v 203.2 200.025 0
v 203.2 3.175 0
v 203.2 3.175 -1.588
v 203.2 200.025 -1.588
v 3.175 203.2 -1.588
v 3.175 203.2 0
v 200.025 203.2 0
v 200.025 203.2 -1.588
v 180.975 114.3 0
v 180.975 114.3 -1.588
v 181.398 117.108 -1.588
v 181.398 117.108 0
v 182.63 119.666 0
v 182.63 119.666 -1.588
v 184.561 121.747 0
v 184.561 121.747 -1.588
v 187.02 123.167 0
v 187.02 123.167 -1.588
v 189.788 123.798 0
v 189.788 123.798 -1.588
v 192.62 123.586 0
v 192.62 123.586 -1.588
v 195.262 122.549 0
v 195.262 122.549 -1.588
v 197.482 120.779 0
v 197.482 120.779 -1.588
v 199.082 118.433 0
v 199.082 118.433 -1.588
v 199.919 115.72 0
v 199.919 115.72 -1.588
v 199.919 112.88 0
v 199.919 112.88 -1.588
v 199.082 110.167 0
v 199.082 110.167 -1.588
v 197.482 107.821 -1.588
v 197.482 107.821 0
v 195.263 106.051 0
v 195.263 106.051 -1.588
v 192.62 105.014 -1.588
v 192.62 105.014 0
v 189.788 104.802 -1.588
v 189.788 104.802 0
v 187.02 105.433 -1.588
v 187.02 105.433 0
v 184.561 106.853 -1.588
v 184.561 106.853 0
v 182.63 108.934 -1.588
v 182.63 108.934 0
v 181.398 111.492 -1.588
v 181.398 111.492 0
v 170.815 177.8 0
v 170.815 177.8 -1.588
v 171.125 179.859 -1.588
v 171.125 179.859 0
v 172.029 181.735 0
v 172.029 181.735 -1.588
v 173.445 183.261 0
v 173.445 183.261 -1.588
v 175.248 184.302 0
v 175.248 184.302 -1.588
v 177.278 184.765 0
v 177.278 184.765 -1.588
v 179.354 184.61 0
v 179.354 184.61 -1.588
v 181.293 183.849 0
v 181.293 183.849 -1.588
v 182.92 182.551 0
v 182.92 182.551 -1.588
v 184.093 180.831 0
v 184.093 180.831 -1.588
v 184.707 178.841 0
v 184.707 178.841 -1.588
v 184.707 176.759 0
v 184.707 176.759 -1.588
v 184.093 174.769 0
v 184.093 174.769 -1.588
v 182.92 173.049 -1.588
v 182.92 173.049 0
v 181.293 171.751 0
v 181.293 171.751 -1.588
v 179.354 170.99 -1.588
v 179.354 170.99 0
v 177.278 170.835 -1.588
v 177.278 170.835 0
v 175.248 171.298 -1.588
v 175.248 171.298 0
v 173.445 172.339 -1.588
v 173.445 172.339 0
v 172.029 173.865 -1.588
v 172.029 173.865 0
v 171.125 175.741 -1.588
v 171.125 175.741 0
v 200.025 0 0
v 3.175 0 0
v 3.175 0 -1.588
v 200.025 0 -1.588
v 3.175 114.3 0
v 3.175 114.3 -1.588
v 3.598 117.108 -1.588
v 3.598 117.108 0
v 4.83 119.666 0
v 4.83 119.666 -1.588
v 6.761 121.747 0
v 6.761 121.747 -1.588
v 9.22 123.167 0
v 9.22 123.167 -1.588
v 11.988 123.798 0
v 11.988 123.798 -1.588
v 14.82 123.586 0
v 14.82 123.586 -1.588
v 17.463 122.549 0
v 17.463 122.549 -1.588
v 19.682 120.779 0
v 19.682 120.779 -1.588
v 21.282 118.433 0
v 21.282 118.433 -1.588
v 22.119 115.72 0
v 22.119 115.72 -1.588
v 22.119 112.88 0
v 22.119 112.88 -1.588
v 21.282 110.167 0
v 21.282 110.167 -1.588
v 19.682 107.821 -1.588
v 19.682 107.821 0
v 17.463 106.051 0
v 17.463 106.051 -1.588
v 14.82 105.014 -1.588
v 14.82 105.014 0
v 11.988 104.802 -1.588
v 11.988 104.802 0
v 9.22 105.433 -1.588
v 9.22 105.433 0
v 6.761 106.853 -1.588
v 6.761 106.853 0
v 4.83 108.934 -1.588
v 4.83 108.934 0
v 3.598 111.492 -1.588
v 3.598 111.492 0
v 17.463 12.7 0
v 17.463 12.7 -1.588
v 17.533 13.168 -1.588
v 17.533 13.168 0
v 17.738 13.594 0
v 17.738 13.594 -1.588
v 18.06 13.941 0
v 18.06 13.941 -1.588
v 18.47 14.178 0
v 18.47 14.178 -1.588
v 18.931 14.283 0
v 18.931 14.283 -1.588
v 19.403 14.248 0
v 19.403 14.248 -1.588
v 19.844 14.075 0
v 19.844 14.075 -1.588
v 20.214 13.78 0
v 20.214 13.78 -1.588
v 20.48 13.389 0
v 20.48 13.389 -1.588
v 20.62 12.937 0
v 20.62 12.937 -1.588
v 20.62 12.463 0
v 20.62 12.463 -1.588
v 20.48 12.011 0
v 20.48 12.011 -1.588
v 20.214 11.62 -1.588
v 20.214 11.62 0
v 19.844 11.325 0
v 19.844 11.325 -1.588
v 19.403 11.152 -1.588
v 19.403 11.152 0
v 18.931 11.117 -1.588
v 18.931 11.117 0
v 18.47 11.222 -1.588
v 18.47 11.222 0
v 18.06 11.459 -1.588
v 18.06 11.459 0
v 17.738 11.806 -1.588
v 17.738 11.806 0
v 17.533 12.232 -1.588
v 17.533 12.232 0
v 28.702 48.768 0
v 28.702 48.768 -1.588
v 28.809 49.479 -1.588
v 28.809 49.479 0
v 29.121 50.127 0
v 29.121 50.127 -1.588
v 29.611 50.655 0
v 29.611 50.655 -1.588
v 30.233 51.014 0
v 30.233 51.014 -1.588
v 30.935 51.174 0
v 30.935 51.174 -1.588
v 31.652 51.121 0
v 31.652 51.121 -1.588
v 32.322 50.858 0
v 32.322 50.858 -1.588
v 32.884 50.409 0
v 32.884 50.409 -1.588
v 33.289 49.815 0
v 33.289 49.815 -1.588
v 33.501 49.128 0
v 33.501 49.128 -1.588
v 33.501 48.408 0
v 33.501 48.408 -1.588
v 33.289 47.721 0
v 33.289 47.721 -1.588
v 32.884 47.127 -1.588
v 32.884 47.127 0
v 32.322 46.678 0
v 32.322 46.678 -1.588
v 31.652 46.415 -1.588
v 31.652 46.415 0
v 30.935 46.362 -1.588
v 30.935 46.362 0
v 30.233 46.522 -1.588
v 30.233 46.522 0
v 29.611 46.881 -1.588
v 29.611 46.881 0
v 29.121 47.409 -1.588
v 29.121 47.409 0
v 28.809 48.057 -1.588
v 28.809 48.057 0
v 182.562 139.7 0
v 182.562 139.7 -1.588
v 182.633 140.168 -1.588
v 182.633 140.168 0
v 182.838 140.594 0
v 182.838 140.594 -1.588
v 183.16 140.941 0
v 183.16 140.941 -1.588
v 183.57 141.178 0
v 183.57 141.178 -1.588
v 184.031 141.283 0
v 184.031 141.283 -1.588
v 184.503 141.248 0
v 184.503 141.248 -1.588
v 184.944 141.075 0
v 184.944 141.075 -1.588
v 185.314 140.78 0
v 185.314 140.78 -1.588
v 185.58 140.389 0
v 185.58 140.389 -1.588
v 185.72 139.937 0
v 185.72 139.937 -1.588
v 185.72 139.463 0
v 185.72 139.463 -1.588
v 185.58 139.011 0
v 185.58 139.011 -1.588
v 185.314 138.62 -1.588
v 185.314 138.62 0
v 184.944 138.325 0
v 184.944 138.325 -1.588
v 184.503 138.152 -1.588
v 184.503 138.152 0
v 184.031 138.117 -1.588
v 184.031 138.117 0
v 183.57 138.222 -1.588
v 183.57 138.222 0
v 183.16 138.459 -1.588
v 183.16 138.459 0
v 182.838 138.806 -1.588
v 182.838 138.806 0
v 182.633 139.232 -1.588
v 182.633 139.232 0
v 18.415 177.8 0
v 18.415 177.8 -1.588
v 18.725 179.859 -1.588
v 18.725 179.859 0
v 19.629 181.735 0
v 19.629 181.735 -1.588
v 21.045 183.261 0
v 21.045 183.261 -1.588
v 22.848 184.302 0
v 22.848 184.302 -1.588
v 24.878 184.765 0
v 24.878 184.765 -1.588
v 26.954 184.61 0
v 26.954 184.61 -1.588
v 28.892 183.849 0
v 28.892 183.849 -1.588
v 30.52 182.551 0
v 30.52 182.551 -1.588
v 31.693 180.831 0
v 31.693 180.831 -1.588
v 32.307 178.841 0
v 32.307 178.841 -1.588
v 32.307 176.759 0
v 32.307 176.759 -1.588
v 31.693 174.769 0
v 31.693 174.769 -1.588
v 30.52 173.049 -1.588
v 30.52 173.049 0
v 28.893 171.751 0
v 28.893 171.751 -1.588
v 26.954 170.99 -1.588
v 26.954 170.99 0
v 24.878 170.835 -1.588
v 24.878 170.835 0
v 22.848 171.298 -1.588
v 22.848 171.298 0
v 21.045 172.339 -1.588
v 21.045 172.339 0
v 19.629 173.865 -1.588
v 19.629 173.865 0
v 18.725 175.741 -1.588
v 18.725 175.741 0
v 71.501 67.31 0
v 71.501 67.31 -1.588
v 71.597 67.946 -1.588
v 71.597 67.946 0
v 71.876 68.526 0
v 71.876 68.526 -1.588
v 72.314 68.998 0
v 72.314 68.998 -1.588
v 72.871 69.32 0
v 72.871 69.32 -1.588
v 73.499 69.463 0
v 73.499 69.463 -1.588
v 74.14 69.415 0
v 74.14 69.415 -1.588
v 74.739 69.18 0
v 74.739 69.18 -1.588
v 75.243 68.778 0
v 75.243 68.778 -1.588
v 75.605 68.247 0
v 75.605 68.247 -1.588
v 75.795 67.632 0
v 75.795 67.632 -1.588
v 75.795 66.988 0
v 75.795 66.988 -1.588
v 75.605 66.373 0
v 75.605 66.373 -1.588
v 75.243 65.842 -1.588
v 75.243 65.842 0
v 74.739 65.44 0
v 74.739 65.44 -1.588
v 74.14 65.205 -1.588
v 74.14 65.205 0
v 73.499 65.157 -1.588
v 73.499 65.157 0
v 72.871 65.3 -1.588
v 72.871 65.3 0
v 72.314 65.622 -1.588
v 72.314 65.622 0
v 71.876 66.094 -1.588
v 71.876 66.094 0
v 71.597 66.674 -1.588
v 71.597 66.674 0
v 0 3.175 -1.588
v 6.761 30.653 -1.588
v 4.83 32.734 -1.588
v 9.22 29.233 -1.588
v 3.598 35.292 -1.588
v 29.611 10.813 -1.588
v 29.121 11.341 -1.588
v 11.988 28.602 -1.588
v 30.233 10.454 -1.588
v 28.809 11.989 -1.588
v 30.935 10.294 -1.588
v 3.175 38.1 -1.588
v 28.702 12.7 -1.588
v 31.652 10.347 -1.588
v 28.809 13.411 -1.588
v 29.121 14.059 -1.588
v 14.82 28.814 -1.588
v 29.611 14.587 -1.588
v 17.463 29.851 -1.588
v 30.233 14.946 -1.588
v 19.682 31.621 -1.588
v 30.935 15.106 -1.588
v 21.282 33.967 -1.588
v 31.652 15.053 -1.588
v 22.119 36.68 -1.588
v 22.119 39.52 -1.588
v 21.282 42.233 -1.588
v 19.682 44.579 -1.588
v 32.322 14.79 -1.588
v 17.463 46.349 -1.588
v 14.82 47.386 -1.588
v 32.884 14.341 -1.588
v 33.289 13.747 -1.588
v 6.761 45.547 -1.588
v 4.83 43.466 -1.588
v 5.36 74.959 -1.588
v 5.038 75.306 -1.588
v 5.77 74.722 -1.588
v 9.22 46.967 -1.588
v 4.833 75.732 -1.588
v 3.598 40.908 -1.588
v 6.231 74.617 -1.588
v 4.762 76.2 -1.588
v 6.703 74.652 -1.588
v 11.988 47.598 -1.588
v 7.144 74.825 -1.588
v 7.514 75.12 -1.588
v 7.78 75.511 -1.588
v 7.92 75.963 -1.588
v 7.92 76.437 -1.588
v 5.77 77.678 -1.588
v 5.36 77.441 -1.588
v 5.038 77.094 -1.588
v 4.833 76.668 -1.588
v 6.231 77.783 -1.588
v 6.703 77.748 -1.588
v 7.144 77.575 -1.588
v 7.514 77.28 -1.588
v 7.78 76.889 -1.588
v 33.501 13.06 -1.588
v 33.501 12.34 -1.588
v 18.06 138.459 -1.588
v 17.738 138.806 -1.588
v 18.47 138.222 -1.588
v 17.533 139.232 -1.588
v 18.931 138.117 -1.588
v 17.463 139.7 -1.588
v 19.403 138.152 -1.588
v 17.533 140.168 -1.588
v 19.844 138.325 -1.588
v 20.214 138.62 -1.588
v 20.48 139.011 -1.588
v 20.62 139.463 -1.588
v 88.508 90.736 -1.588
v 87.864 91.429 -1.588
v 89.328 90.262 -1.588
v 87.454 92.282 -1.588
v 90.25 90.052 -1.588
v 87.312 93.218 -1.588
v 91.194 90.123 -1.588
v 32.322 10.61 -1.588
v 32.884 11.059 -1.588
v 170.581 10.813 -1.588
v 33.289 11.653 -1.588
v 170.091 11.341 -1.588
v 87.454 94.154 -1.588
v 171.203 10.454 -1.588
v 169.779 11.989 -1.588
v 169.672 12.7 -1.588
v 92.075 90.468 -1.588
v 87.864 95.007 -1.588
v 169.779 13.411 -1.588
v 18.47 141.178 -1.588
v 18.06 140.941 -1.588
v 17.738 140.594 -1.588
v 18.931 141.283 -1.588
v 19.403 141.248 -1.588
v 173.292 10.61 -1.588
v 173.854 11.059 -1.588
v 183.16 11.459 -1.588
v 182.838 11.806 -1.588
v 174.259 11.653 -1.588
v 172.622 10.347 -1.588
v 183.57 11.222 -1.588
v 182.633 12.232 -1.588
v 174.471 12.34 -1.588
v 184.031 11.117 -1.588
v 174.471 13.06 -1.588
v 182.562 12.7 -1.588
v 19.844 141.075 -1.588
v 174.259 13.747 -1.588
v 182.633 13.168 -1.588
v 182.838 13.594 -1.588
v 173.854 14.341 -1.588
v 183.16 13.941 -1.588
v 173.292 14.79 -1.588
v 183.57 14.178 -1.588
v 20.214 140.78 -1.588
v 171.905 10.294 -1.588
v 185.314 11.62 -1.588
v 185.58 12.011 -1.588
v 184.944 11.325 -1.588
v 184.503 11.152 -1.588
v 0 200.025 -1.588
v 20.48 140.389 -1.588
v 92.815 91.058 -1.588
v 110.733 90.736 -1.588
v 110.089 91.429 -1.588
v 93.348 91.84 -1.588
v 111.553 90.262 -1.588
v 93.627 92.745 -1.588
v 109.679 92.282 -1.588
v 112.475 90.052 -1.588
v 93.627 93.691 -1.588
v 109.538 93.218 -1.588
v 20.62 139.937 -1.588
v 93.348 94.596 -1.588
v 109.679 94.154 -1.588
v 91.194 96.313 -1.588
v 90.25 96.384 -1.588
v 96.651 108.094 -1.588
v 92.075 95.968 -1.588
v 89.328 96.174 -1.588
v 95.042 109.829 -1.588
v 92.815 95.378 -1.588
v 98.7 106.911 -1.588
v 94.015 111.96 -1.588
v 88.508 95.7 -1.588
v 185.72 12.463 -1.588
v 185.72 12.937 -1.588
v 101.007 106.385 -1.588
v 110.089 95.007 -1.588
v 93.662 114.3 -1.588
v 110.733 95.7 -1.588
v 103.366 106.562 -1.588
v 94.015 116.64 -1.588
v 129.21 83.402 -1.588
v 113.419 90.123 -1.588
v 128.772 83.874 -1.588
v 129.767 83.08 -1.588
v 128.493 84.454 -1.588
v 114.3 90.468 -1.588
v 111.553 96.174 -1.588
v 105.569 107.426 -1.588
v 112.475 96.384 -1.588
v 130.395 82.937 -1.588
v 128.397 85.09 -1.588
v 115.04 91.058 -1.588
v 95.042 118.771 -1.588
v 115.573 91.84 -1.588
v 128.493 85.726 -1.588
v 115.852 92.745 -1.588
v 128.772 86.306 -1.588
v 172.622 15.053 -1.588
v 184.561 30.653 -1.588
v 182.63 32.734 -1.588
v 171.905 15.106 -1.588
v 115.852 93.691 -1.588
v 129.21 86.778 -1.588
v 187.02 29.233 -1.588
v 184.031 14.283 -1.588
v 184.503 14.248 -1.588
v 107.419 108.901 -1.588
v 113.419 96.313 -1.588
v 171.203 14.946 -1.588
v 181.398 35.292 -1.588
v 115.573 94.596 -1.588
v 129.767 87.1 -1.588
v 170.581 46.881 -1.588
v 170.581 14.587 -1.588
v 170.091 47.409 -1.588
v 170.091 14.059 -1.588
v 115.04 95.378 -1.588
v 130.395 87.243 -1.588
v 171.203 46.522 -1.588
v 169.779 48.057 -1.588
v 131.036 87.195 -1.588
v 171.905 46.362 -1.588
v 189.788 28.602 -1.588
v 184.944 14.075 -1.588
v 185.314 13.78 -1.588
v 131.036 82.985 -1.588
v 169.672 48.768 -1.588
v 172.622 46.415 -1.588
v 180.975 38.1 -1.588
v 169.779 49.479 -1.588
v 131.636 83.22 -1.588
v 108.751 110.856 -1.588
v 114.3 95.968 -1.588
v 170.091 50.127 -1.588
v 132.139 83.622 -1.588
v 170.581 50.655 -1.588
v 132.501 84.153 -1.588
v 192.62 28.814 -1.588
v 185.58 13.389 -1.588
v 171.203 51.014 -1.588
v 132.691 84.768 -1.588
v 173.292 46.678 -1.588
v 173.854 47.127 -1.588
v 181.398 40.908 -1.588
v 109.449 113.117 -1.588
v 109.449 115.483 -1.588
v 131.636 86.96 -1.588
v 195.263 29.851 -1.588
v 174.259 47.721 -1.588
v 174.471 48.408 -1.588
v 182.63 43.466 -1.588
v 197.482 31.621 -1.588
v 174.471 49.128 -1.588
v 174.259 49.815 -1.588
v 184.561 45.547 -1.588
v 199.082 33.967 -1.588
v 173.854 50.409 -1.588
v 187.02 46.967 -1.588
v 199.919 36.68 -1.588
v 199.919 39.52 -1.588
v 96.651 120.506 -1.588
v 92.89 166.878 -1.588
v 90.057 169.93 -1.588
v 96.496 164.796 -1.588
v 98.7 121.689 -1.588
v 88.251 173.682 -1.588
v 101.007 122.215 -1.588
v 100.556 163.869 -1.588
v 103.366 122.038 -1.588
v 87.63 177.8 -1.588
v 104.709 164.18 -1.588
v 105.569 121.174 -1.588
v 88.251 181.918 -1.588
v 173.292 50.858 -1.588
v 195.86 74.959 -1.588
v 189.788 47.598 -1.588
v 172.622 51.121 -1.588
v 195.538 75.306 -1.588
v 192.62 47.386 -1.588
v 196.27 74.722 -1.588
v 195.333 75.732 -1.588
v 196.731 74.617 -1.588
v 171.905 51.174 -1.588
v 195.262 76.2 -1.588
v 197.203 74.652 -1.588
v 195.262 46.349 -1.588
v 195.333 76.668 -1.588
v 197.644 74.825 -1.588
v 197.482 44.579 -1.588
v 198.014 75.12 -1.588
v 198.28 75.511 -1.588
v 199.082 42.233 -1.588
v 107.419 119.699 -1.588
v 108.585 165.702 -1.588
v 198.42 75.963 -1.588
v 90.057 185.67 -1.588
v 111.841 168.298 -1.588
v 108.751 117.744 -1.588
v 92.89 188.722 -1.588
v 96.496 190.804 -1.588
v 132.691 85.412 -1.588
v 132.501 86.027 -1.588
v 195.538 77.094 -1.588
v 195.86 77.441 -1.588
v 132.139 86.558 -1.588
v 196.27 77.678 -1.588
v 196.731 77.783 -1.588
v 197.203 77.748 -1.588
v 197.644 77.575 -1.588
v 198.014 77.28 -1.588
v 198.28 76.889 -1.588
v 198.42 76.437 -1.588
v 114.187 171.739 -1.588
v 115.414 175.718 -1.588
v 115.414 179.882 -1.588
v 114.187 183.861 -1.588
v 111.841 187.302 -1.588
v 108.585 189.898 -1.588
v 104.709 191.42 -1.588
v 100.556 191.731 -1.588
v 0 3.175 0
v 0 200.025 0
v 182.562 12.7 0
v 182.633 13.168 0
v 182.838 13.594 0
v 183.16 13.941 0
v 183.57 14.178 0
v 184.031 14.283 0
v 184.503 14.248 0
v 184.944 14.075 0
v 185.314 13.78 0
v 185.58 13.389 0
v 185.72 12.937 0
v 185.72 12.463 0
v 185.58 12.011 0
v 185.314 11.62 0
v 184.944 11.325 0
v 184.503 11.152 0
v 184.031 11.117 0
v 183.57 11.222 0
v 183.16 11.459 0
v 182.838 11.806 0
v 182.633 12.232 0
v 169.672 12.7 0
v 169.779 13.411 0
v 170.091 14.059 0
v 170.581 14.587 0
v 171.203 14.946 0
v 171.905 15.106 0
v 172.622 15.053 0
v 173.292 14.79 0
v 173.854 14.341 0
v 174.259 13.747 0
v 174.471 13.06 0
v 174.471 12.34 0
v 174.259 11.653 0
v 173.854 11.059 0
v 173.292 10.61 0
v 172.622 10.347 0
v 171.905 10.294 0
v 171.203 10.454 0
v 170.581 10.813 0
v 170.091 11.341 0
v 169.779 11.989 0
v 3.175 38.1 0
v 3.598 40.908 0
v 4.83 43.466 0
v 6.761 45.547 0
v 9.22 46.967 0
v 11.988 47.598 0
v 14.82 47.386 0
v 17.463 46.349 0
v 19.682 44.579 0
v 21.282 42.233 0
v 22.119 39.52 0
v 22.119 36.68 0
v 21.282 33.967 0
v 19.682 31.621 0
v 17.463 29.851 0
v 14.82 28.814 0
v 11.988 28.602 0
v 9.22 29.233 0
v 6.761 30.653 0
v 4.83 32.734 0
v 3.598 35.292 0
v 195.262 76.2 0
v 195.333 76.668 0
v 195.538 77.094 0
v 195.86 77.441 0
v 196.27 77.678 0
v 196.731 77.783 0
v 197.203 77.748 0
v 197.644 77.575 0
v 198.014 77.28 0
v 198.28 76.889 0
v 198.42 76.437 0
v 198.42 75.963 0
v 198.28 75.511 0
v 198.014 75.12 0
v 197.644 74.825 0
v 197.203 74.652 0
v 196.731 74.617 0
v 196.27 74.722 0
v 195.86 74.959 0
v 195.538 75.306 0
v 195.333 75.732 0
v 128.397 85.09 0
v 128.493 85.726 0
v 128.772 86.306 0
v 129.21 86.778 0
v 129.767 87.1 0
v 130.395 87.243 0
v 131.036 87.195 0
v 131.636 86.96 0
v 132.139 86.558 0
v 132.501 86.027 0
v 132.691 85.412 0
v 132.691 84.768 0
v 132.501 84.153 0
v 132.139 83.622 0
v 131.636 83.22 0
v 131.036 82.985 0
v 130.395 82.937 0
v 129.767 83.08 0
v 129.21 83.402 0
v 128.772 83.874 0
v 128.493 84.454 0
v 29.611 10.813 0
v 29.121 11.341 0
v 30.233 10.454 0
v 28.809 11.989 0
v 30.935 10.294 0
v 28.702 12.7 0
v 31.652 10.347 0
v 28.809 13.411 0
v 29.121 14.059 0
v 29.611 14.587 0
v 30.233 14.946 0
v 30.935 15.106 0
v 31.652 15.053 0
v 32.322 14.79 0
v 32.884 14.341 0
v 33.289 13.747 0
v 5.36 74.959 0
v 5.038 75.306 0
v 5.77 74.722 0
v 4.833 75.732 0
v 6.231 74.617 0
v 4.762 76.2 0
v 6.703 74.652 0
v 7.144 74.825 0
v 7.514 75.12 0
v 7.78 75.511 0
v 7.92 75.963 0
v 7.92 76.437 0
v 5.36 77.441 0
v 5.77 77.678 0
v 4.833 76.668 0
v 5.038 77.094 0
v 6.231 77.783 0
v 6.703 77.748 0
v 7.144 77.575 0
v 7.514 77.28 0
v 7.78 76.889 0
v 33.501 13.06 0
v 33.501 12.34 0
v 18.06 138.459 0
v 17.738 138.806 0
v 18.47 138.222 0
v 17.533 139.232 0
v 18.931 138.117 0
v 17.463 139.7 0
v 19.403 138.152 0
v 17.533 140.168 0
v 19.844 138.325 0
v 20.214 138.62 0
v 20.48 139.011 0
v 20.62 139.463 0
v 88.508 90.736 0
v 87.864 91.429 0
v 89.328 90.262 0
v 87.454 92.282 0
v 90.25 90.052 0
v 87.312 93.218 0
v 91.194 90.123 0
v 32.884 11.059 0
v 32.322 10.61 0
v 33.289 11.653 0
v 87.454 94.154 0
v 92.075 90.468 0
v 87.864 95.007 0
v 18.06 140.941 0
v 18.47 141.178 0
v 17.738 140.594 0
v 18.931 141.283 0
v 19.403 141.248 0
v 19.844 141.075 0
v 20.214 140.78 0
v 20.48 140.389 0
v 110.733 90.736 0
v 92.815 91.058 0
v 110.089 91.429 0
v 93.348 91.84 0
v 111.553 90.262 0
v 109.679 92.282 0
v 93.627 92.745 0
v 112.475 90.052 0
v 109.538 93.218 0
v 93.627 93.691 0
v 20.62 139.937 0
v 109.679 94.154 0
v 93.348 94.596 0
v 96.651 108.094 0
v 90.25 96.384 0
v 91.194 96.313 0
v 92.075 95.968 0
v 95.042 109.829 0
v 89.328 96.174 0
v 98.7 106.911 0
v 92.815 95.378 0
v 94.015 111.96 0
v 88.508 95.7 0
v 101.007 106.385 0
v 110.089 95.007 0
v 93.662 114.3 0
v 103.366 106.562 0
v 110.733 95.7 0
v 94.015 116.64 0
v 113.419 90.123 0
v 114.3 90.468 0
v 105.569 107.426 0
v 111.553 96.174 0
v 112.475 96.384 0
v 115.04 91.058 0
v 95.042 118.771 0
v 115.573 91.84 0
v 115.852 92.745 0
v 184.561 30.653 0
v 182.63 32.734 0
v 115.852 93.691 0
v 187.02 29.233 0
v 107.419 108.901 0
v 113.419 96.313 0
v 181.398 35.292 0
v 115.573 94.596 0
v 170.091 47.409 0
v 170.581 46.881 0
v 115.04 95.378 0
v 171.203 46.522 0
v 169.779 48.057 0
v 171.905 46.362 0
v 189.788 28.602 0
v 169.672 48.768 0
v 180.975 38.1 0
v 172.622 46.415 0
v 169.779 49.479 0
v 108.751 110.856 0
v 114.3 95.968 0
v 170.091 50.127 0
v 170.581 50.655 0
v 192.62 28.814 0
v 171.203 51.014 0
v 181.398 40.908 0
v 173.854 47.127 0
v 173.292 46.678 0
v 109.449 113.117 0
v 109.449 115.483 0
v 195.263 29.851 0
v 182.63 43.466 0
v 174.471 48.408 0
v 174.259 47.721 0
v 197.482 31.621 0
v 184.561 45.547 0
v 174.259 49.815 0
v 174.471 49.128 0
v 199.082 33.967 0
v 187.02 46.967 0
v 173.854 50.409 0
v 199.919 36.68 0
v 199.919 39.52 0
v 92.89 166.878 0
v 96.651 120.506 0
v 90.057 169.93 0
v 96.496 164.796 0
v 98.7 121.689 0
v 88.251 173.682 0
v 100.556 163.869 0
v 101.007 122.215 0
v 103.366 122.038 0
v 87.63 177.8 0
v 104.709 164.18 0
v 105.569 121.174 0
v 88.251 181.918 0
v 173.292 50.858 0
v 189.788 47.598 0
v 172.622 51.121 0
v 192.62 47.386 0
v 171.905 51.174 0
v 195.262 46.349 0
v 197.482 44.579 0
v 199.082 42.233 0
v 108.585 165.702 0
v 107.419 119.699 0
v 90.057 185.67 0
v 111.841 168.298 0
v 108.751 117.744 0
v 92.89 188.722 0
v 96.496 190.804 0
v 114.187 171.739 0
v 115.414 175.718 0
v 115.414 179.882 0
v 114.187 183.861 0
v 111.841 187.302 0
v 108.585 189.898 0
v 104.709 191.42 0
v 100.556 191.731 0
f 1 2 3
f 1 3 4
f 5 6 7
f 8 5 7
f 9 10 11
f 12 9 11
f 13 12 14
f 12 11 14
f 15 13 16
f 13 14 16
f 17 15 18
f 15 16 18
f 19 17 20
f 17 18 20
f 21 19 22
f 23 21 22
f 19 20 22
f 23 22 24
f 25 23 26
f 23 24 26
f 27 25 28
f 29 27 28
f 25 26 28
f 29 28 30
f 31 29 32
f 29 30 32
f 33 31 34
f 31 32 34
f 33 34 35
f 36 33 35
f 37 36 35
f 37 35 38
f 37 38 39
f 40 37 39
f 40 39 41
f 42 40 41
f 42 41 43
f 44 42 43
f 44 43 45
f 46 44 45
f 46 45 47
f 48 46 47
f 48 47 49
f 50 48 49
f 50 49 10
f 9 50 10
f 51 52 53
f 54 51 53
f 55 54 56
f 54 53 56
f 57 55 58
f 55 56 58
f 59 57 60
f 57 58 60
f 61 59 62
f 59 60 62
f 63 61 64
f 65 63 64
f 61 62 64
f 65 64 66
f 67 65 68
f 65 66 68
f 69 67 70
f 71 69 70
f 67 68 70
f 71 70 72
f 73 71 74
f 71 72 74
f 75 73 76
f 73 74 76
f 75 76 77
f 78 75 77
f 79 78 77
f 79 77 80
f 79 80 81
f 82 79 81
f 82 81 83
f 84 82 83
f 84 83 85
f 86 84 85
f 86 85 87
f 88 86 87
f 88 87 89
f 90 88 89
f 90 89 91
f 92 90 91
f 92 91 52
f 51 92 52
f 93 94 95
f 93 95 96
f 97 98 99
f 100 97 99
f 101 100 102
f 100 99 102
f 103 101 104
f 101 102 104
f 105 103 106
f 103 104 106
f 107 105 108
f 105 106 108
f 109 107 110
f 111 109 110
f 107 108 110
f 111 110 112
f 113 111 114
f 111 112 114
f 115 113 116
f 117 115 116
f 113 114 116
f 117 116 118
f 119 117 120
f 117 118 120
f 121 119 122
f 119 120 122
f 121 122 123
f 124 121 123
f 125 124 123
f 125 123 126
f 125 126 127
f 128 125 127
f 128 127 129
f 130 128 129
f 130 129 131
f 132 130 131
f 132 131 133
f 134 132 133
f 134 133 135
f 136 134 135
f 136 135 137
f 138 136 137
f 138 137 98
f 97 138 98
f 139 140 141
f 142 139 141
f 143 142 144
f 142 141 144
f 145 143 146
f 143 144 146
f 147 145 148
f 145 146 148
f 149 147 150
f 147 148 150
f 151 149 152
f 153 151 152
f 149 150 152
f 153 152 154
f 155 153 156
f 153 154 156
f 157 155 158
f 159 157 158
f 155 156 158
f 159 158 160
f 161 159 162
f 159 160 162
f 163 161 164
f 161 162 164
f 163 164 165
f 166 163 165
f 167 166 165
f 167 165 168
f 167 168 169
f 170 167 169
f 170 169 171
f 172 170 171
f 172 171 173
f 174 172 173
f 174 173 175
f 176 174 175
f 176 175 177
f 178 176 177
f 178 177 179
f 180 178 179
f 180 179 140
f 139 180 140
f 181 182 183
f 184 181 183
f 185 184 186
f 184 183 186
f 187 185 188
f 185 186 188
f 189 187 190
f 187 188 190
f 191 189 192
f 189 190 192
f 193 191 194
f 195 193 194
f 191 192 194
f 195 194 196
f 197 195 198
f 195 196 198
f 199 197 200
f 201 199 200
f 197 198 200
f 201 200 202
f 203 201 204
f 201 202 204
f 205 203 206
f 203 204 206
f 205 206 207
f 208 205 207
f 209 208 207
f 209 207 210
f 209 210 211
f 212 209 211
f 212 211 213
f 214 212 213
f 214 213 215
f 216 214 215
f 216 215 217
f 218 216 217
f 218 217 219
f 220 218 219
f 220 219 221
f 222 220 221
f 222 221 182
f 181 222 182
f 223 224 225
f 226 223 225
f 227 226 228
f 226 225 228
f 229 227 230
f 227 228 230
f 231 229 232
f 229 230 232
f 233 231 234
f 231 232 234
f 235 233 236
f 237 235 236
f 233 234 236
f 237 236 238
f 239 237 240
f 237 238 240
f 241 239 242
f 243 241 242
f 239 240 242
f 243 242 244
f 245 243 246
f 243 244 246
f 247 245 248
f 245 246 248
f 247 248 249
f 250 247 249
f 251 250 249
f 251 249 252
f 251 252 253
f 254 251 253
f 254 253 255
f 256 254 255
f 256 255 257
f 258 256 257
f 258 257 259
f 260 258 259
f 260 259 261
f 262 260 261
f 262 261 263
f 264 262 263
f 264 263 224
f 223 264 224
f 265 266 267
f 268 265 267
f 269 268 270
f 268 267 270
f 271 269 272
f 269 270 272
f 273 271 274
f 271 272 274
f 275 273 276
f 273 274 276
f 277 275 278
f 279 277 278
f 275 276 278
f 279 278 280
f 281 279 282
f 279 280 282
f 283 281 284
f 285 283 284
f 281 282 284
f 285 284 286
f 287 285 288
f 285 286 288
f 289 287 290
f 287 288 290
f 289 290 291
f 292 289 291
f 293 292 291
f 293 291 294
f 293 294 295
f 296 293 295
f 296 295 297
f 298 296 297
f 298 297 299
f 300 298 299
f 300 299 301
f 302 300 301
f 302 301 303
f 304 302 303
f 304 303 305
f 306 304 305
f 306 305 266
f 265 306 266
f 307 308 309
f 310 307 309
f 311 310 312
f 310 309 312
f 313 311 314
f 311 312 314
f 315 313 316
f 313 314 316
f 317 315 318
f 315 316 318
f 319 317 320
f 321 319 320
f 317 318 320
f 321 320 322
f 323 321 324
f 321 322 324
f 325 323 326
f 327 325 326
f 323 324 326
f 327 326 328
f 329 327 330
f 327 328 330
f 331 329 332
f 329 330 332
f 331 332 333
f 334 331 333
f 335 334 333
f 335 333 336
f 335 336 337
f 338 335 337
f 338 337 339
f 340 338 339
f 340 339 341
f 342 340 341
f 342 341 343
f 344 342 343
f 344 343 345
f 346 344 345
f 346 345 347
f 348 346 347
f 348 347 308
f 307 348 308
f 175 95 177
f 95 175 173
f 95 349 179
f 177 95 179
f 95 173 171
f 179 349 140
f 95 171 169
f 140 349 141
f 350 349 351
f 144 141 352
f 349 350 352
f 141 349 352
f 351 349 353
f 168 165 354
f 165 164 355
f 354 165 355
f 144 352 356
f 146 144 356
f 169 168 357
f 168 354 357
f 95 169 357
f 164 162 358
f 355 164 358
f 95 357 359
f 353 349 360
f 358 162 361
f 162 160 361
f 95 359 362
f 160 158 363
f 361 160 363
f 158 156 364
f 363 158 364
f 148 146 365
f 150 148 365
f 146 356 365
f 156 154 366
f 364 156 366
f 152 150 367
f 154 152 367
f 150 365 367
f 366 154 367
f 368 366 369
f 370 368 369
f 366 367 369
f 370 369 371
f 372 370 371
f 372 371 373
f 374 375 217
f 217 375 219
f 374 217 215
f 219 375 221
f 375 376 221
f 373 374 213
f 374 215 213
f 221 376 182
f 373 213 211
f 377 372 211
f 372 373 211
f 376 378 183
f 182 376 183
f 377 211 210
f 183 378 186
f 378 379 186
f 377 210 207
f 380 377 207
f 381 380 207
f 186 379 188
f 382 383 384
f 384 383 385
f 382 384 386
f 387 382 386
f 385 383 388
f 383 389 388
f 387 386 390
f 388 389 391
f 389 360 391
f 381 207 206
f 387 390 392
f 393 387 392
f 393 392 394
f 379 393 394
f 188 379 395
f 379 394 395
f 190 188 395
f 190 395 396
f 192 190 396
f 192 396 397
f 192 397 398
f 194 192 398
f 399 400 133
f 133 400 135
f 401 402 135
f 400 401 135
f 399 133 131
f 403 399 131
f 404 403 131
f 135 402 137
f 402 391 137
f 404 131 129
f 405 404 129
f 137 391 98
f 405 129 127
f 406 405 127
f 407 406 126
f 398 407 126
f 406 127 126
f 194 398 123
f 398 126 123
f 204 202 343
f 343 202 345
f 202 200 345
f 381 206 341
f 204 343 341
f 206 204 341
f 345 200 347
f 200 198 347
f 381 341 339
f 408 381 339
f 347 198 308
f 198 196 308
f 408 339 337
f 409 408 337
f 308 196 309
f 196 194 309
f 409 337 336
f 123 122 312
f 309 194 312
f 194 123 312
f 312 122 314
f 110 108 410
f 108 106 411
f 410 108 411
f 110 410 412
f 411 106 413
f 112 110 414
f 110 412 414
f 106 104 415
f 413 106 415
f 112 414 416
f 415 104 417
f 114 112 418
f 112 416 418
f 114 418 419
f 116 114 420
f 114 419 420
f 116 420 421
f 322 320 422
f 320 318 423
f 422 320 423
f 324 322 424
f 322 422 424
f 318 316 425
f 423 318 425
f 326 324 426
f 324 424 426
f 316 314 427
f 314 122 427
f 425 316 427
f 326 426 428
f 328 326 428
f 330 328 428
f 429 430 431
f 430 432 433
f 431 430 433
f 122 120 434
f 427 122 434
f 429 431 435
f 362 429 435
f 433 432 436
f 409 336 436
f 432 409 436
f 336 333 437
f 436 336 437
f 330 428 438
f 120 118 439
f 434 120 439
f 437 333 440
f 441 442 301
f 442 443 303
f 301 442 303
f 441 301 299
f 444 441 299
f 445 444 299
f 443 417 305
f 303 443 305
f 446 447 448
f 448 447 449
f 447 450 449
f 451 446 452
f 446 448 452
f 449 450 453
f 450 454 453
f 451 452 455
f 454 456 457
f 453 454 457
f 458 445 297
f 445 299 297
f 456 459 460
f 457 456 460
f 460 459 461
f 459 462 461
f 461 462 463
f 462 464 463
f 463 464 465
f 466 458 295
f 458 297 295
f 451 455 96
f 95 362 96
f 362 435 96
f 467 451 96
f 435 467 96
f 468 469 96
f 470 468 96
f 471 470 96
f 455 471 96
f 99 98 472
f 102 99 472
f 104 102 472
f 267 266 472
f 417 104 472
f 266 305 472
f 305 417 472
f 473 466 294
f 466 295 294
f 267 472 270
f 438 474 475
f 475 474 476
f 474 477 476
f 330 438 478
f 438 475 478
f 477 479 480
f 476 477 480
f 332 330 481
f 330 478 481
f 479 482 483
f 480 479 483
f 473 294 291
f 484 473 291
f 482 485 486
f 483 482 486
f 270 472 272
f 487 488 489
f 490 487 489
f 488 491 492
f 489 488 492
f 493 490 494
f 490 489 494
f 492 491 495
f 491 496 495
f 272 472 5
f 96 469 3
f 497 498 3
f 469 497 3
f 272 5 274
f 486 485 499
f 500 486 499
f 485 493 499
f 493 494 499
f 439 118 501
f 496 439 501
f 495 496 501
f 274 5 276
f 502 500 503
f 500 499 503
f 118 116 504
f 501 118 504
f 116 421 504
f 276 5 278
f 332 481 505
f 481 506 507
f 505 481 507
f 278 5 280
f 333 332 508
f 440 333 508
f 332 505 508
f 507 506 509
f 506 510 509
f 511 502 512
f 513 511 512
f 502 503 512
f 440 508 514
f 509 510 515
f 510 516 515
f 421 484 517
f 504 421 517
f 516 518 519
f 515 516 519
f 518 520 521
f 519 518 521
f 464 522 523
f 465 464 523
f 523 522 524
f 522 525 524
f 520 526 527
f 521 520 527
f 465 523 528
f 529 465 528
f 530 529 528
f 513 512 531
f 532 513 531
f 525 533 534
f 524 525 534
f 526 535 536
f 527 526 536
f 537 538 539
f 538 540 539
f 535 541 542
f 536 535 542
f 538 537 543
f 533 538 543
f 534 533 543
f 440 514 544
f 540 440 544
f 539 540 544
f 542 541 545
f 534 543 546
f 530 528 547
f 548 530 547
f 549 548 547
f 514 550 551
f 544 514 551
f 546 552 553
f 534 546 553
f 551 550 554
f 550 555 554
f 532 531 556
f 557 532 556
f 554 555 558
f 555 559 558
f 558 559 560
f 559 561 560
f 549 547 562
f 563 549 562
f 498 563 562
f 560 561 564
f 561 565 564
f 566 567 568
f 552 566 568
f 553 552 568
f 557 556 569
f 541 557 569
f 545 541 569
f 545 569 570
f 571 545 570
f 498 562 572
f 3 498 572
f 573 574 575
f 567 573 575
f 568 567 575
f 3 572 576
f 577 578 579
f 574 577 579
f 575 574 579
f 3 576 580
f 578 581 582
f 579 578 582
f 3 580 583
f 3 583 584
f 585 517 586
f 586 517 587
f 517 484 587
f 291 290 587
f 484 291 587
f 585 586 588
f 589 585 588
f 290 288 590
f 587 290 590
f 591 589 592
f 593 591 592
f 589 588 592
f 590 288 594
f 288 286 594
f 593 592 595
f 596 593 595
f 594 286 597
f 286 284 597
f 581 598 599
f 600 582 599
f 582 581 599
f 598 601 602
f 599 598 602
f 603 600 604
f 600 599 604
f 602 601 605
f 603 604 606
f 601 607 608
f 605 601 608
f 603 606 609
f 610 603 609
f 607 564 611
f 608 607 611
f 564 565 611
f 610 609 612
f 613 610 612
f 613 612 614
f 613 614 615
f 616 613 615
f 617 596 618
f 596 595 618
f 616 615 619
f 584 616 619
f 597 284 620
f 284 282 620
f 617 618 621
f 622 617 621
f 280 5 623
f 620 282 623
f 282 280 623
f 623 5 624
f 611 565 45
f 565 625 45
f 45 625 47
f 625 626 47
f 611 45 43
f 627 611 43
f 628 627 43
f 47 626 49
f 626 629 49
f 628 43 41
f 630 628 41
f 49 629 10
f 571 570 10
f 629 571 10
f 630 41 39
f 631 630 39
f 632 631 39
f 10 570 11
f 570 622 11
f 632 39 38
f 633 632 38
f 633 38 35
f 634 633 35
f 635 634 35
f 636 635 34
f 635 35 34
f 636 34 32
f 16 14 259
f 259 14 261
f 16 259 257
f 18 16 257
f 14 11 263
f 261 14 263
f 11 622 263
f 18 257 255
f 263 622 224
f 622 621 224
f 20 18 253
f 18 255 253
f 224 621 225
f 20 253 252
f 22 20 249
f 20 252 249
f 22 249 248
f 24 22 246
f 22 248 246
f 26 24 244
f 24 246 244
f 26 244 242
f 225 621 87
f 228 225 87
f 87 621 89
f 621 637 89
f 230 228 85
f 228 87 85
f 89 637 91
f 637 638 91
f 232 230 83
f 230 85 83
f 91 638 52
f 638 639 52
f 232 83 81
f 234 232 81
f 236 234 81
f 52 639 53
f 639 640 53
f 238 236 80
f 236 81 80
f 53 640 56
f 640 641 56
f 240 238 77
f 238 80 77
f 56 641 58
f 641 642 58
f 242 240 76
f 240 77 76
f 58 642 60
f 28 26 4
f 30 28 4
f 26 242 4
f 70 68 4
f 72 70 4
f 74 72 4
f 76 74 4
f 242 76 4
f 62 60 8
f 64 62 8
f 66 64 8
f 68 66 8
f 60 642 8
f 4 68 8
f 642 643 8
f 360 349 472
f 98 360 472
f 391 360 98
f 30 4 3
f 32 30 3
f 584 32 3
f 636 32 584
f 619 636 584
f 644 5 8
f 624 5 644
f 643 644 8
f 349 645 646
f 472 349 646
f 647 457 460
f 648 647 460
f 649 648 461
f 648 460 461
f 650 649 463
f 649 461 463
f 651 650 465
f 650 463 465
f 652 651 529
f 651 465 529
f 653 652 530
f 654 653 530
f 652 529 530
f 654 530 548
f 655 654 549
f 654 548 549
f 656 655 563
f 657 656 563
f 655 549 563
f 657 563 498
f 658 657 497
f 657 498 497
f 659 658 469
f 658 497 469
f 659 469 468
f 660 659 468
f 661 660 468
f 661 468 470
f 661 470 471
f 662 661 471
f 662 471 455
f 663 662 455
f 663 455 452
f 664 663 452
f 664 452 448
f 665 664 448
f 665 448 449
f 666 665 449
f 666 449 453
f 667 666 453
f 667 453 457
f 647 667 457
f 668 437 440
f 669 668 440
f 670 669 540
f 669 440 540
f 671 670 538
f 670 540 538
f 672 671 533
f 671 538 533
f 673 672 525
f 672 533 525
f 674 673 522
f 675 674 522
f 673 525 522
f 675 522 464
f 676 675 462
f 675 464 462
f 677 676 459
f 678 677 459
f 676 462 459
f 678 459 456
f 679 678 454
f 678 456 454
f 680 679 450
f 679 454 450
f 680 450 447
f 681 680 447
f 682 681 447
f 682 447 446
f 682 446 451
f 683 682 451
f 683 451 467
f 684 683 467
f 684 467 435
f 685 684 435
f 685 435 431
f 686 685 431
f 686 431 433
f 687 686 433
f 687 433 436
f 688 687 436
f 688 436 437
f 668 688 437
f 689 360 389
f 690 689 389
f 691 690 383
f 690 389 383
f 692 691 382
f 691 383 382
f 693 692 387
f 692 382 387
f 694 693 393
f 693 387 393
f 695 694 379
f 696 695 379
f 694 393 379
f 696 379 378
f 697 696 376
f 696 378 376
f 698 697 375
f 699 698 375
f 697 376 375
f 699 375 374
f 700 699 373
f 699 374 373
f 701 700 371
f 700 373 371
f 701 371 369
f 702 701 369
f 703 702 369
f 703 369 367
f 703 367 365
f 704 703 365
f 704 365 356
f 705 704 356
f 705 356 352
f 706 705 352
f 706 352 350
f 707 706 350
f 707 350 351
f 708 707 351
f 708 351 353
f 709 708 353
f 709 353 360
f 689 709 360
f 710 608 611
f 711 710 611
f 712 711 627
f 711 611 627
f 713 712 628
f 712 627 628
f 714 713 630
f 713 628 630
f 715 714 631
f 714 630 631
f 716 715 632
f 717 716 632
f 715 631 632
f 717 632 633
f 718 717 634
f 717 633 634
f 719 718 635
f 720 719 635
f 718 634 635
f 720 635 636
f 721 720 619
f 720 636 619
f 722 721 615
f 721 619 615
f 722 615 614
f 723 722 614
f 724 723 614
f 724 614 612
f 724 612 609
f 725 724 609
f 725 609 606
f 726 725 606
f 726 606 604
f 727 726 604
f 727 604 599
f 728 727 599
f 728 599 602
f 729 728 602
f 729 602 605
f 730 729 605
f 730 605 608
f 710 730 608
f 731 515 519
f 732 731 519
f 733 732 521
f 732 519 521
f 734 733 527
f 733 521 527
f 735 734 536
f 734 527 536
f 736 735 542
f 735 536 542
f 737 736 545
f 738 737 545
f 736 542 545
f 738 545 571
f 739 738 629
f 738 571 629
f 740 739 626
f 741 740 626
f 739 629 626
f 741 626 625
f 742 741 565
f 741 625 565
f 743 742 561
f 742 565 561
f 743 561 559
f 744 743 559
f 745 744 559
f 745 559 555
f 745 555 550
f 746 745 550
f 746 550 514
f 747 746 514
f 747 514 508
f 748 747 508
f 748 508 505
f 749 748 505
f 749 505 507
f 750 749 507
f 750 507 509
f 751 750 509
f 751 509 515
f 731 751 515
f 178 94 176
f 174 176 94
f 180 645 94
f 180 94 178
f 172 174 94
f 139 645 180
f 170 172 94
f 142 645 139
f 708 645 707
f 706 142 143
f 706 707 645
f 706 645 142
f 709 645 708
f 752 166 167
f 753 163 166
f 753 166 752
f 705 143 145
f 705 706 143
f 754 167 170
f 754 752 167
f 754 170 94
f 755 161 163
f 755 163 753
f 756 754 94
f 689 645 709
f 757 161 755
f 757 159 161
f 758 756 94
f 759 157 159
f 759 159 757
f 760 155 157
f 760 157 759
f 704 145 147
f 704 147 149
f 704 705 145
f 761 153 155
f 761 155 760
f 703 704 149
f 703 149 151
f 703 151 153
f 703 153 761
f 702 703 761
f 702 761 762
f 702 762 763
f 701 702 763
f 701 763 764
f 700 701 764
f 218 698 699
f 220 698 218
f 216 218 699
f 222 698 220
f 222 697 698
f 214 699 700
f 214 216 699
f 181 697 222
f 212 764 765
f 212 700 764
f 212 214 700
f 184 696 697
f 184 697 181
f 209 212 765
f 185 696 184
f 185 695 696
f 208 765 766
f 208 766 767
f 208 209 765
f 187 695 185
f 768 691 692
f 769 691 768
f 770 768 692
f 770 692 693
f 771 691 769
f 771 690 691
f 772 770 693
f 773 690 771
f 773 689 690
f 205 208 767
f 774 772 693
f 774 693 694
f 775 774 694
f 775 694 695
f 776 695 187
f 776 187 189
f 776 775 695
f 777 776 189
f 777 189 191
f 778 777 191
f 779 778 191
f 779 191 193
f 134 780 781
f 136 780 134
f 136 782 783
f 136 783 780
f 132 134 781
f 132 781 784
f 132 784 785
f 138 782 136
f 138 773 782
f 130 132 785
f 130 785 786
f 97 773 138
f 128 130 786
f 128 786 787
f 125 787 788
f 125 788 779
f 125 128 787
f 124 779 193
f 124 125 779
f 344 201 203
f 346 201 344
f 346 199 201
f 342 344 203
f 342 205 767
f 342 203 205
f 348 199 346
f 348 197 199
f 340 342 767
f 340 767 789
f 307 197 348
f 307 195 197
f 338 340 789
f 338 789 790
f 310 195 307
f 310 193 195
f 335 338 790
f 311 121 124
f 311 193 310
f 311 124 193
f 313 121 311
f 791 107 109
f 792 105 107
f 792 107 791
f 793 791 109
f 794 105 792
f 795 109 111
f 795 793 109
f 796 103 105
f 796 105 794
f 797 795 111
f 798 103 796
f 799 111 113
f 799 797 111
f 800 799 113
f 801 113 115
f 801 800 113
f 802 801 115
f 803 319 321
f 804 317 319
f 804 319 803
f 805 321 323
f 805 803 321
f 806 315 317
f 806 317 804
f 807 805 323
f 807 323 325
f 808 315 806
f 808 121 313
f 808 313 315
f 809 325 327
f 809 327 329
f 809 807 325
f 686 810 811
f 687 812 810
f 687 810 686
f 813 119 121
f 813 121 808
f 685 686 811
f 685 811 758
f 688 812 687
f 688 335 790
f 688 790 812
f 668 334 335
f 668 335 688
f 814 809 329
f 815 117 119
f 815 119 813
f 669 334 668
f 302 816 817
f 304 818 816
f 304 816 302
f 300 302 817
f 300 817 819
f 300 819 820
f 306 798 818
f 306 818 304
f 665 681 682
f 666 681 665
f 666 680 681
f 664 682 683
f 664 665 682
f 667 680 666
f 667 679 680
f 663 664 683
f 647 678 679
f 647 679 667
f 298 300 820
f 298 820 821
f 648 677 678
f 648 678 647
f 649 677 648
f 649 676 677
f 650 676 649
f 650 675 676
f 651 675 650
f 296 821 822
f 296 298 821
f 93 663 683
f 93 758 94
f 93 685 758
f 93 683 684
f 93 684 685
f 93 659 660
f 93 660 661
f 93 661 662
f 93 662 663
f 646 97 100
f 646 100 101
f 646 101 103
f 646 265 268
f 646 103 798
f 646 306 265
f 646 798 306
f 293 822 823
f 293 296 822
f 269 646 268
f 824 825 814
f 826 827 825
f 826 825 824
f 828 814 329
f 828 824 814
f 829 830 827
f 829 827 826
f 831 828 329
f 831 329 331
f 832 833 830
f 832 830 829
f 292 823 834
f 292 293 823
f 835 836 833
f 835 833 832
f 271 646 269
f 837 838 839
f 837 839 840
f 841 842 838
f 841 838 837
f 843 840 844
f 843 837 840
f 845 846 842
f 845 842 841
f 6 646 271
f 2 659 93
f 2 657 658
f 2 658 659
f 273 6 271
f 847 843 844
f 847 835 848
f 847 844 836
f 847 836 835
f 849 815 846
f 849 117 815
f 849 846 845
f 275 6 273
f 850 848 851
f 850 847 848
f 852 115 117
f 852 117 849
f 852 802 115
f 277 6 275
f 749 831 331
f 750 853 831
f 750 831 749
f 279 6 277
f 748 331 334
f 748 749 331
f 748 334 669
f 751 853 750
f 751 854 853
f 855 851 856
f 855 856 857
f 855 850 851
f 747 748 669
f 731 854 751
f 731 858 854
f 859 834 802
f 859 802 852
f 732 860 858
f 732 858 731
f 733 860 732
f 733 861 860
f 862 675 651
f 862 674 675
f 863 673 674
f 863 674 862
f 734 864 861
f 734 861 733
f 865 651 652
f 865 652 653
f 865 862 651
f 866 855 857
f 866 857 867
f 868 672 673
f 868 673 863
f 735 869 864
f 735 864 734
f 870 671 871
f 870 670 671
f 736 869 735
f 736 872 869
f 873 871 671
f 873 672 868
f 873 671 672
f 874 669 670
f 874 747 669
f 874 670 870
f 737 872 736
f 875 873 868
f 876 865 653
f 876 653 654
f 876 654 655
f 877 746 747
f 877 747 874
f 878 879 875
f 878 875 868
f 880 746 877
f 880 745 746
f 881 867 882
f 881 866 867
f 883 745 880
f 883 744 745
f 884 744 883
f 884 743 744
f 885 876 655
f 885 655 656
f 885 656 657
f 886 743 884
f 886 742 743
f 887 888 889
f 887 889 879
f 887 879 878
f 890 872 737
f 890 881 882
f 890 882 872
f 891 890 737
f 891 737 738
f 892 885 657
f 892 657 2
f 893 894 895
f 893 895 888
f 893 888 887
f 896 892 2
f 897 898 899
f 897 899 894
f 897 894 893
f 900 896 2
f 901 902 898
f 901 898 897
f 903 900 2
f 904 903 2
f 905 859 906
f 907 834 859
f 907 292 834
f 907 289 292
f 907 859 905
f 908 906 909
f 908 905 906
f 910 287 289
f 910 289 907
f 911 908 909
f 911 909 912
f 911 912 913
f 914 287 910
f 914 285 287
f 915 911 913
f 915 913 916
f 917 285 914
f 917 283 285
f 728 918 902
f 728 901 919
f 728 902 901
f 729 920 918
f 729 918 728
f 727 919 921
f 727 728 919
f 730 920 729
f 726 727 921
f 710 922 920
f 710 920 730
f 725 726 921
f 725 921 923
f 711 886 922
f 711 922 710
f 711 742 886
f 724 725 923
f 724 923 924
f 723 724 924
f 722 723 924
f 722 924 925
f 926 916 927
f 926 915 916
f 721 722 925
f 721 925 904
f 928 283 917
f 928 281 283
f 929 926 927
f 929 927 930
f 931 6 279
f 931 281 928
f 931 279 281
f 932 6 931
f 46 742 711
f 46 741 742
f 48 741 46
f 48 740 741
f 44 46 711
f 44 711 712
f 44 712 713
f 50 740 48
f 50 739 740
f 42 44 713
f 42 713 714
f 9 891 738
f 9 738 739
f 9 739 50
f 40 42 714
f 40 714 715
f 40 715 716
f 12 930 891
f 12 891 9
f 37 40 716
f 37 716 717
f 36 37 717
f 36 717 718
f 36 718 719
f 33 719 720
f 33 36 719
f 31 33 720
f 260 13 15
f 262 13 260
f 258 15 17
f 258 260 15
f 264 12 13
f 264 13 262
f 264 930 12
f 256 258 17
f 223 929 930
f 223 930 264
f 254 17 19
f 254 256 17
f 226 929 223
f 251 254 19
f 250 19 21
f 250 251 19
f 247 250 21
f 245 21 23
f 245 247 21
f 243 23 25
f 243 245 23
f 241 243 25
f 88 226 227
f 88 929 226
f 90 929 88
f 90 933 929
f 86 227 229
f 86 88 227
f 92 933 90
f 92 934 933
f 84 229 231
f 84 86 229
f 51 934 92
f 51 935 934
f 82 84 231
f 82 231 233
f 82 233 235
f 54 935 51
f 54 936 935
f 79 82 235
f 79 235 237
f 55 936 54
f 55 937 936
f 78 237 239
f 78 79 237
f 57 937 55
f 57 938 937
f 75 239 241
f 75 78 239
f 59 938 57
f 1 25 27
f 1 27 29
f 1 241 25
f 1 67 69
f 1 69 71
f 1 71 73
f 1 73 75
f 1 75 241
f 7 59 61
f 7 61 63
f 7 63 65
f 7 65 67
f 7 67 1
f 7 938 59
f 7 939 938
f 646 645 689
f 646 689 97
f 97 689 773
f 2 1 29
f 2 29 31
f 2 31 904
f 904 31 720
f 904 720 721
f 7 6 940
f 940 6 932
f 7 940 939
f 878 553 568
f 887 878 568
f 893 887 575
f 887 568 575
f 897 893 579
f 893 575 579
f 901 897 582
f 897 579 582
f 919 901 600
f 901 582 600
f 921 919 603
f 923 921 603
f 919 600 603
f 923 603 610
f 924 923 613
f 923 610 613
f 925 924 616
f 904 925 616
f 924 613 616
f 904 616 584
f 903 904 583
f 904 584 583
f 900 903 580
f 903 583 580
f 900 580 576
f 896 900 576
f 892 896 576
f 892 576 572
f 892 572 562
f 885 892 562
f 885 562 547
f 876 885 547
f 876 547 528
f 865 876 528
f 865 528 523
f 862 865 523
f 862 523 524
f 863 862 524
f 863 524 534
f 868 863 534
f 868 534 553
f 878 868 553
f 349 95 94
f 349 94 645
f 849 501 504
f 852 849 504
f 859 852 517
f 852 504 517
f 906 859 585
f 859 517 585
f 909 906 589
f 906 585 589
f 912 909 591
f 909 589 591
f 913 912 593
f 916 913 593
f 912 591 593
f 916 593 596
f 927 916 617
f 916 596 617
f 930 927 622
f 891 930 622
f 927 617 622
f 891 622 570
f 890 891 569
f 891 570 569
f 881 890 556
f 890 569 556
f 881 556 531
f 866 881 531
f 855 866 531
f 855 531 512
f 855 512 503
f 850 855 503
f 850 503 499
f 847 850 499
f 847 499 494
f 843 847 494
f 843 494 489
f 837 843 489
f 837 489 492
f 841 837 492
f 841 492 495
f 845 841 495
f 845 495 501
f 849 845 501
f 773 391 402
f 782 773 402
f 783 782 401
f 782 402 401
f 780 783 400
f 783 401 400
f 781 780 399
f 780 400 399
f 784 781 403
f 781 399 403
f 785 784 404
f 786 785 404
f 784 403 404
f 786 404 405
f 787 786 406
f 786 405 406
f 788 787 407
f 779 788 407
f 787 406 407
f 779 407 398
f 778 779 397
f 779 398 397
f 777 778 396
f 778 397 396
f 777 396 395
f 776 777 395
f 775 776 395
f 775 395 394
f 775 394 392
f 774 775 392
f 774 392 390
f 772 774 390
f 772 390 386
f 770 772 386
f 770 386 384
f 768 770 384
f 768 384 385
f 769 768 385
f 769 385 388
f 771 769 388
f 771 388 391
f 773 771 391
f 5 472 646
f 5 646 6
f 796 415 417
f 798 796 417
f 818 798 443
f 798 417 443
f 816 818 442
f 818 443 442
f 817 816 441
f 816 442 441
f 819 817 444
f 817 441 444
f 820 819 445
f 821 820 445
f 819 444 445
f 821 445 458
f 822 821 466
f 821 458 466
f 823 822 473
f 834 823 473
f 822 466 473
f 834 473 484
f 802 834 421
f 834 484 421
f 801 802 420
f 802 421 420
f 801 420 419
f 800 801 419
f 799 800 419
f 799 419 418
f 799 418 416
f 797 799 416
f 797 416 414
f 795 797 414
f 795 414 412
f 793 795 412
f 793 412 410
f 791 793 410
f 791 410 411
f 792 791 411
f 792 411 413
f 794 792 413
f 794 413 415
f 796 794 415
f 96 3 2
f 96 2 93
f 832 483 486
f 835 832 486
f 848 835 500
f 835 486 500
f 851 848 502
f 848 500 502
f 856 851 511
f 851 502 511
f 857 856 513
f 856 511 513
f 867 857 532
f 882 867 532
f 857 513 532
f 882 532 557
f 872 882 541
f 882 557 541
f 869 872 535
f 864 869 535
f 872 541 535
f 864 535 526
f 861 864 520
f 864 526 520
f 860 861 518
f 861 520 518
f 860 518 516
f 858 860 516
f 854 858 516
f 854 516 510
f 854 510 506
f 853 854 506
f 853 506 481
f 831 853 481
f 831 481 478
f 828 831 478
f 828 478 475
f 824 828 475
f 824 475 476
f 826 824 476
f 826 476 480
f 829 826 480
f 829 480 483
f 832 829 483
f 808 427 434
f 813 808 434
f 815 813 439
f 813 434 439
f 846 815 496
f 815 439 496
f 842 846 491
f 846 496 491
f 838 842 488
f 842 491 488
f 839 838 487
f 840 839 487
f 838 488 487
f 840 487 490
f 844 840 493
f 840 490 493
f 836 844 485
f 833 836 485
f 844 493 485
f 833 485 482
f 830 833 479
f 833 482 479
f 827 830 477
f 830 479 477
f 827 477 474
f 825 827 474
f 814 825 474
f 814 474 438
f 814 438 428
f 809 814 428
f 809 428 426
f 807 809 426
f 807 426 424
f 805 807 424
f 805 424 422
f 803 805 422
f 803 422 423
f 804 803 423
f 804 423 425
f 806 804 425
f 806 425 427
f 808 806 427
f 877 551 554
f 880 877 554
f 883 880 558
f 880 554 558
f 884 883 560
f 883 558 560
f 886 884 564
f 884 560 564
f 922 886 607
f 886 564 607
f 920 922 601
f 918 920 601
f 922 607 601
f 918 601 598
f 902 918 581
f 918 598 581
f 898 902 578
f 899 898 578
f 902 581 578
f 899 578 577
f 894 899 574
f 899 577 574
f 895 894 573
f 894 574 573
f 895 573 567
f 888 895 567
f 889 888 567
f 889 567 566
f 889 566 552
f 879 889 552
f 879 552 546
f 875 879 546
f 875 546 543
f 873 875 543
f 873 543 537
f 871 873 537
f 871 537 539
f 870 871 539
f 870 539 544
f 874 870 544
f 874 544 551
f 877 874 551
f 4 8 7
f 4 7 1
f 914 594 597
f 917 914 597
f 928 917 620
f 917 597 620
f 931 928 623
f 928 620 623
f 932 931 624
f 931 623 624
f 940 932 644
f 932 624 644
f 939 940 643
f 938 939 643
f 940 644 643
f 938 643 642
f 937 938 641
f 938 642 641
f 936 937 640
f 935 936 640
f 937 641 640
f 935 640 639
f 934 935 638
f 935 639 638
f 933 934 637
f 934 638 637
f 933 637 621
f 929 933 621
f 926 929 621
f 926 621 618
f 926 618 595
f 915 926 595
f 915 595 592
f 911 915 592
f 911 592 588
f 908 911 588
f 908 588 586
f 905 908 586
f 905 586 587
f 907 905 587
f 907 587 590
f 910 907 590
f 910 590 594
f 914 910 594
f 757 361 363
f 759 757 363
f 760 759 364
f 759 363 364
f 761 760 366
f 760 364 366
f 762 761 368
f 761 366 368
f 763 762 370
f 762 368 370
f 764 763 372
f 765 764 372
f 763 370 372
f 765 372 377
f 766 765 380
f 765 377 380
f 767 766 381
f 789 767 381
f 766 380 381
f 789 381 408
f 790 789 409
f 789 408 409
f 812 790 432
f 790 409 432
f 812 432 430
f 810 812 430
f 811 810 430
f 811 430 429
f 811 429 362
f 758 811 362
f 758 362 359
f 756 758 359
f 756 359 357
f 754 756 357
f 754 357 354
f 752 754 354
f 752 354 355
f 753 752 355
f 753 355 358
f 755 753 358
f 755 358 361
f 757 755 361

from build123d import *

# Parameters (mm, degrees)
SKETCH1_W           = 203.2
SKETCH1_H           = 203.2
BASE_FLANGE1_DEPTH  = 1.5875
SKETCH6_R           = 1.5875
SKETCH6_R_2         = 2.413
SKETCH6_R_3         = 9.525
CUT_EXTRUDE1_DEPTH  = 288.372580731
BREAK_CORNER1_START = -1.5875
BREAK_CORNER1_DEPTH = 1.5875
SKETCH7_R           = 6.985
SKETCH7_R_2         = 13.97
SKETCH7_R_3         = 7.9375
SKETCH7_R_4         = 3.175
SKETCH7_R_5         = 2.159
CUT_EXTRUDE2_DEPTH  = 288.372580731


# Read off the part's stored shape, not the designer's step: Break-Corner1
# Sheet-metal steps are written as plain solids
with BuildPart() as part:
    # Sketch1 → Base-Flange1 (new body)
    with BuildSketch(Plane.XY):
        with Locations((101.6, 101.6)):
            Rectangle(SKETCH1_W, SKETCH1_H)
    extrude(amount=-BASE_FLANGE1_DEPTH)

    # Sketch6 → Cut-Extrude1 (cut, through all)
    with BuildSketch(Plane(origin=(0, 0, -1.5875), x_dir=(-1, 0, 0), z_dir=(0, 0, -1))):
        with Locations((-19.05, 139.7)):
            Circle(SKETCH6_R)
        with Locations((-19.05, 12.7)):
            Circle(SKETCH6_R)
        with Locations((-31.115, 48.768)):
            Circle(SKETCH6_R_2)
        with Locations((-31.115, 12.7)):
            Circle(SKETCH6_R_2)
        with Locations((-172.085, 48.768)):
            Circle(SKETCH6_R_2)
        with Locations((-172.085, 12.7)):
            Circle(SKETCH6_R_2)
        with Locations((-184.15, 139.7)):
            Circle(SKETCH6_R)
        with Locations((-184.15, 12.7)):
            Circle(SKETCH6_R)
        with Locations((-190.5, 38.1)):
            Circle(SKETCH6_R_3)
        with Locations((-190.5, 114.3)):
            Circle(SKETCH6_R_3)
        with Locations((-12.7, 114.3)):
            Circle(SKETCH6_R_3)
        with Locations((-12.7, 38.1)):
            Circle(SKETCH6_R_3)
        with Locations((-6.35, 76.2)):
            Circle(SKETCH6_R)
        with Locations((-196.85, 76.2)):
            Circle(SKETCH6_R)
    extrude(amount=-CUT_EXTRUDE1_DEPTH, mode=Mode.SUBTRACT)

    # Break-Corner1 outline → Break-Corner1 (cut)
    with BuildSketch(Plane.XY.offset(BREAK_CORNER1_START)):
        Polygon((0, 0), (3.175, 0), (0, 3.175), align=None)
        Polygon((203.2, 3.175), (200.025, 0), (203.2, 0), align=None)
        Polygon((0, 203.2), (0, 200.025), (3.175, 203.2), align=None)
        Polygon((200.025, 203.2), (203.2, 200.025), (203.2, 203.2), align=None)
    extrude(amount=BREAK_CORNER1_DEPTH, mode=Mode.SUBTRACT)

    # Sketch7 → Cut-Extrude2 (cut, through all)
    with BuildSketch(Plane(origin=(0, 0, -1.5875), x_dir=(-1, 0, 0), z_dir=(0, 0, -1))):
        with Locations((-177.8, 177.8)):
            Circle(SKETCH7_R)
        with Locations((-101.6, 177.8)):
            Circle(SKETCH7_R_2)
        with Locations((-25.4, 177.8)):
            Circle(SKETCH7_R)
        with Locations((-101.6, 114.3)):
            Circle(SKETCH7_R_3)
        with Locations((-112.7125, 93.218)):
            Circle(SKETCH7_R_4)
        with Locations((-90.4875, 93.218)):
            Circle(SKETCH7_R_4)
        with Locations((-130.556, 85.09)):
            Circle(SKETCH7_R_5)
        with Locations((-73.66, 67.31)):
            Circle(SKETCH7_R_5)
    extrude(amount=-CUT_EXTRUDE2_DEPTH, mode=Mode.SUBTRACT)


solid = part.part
